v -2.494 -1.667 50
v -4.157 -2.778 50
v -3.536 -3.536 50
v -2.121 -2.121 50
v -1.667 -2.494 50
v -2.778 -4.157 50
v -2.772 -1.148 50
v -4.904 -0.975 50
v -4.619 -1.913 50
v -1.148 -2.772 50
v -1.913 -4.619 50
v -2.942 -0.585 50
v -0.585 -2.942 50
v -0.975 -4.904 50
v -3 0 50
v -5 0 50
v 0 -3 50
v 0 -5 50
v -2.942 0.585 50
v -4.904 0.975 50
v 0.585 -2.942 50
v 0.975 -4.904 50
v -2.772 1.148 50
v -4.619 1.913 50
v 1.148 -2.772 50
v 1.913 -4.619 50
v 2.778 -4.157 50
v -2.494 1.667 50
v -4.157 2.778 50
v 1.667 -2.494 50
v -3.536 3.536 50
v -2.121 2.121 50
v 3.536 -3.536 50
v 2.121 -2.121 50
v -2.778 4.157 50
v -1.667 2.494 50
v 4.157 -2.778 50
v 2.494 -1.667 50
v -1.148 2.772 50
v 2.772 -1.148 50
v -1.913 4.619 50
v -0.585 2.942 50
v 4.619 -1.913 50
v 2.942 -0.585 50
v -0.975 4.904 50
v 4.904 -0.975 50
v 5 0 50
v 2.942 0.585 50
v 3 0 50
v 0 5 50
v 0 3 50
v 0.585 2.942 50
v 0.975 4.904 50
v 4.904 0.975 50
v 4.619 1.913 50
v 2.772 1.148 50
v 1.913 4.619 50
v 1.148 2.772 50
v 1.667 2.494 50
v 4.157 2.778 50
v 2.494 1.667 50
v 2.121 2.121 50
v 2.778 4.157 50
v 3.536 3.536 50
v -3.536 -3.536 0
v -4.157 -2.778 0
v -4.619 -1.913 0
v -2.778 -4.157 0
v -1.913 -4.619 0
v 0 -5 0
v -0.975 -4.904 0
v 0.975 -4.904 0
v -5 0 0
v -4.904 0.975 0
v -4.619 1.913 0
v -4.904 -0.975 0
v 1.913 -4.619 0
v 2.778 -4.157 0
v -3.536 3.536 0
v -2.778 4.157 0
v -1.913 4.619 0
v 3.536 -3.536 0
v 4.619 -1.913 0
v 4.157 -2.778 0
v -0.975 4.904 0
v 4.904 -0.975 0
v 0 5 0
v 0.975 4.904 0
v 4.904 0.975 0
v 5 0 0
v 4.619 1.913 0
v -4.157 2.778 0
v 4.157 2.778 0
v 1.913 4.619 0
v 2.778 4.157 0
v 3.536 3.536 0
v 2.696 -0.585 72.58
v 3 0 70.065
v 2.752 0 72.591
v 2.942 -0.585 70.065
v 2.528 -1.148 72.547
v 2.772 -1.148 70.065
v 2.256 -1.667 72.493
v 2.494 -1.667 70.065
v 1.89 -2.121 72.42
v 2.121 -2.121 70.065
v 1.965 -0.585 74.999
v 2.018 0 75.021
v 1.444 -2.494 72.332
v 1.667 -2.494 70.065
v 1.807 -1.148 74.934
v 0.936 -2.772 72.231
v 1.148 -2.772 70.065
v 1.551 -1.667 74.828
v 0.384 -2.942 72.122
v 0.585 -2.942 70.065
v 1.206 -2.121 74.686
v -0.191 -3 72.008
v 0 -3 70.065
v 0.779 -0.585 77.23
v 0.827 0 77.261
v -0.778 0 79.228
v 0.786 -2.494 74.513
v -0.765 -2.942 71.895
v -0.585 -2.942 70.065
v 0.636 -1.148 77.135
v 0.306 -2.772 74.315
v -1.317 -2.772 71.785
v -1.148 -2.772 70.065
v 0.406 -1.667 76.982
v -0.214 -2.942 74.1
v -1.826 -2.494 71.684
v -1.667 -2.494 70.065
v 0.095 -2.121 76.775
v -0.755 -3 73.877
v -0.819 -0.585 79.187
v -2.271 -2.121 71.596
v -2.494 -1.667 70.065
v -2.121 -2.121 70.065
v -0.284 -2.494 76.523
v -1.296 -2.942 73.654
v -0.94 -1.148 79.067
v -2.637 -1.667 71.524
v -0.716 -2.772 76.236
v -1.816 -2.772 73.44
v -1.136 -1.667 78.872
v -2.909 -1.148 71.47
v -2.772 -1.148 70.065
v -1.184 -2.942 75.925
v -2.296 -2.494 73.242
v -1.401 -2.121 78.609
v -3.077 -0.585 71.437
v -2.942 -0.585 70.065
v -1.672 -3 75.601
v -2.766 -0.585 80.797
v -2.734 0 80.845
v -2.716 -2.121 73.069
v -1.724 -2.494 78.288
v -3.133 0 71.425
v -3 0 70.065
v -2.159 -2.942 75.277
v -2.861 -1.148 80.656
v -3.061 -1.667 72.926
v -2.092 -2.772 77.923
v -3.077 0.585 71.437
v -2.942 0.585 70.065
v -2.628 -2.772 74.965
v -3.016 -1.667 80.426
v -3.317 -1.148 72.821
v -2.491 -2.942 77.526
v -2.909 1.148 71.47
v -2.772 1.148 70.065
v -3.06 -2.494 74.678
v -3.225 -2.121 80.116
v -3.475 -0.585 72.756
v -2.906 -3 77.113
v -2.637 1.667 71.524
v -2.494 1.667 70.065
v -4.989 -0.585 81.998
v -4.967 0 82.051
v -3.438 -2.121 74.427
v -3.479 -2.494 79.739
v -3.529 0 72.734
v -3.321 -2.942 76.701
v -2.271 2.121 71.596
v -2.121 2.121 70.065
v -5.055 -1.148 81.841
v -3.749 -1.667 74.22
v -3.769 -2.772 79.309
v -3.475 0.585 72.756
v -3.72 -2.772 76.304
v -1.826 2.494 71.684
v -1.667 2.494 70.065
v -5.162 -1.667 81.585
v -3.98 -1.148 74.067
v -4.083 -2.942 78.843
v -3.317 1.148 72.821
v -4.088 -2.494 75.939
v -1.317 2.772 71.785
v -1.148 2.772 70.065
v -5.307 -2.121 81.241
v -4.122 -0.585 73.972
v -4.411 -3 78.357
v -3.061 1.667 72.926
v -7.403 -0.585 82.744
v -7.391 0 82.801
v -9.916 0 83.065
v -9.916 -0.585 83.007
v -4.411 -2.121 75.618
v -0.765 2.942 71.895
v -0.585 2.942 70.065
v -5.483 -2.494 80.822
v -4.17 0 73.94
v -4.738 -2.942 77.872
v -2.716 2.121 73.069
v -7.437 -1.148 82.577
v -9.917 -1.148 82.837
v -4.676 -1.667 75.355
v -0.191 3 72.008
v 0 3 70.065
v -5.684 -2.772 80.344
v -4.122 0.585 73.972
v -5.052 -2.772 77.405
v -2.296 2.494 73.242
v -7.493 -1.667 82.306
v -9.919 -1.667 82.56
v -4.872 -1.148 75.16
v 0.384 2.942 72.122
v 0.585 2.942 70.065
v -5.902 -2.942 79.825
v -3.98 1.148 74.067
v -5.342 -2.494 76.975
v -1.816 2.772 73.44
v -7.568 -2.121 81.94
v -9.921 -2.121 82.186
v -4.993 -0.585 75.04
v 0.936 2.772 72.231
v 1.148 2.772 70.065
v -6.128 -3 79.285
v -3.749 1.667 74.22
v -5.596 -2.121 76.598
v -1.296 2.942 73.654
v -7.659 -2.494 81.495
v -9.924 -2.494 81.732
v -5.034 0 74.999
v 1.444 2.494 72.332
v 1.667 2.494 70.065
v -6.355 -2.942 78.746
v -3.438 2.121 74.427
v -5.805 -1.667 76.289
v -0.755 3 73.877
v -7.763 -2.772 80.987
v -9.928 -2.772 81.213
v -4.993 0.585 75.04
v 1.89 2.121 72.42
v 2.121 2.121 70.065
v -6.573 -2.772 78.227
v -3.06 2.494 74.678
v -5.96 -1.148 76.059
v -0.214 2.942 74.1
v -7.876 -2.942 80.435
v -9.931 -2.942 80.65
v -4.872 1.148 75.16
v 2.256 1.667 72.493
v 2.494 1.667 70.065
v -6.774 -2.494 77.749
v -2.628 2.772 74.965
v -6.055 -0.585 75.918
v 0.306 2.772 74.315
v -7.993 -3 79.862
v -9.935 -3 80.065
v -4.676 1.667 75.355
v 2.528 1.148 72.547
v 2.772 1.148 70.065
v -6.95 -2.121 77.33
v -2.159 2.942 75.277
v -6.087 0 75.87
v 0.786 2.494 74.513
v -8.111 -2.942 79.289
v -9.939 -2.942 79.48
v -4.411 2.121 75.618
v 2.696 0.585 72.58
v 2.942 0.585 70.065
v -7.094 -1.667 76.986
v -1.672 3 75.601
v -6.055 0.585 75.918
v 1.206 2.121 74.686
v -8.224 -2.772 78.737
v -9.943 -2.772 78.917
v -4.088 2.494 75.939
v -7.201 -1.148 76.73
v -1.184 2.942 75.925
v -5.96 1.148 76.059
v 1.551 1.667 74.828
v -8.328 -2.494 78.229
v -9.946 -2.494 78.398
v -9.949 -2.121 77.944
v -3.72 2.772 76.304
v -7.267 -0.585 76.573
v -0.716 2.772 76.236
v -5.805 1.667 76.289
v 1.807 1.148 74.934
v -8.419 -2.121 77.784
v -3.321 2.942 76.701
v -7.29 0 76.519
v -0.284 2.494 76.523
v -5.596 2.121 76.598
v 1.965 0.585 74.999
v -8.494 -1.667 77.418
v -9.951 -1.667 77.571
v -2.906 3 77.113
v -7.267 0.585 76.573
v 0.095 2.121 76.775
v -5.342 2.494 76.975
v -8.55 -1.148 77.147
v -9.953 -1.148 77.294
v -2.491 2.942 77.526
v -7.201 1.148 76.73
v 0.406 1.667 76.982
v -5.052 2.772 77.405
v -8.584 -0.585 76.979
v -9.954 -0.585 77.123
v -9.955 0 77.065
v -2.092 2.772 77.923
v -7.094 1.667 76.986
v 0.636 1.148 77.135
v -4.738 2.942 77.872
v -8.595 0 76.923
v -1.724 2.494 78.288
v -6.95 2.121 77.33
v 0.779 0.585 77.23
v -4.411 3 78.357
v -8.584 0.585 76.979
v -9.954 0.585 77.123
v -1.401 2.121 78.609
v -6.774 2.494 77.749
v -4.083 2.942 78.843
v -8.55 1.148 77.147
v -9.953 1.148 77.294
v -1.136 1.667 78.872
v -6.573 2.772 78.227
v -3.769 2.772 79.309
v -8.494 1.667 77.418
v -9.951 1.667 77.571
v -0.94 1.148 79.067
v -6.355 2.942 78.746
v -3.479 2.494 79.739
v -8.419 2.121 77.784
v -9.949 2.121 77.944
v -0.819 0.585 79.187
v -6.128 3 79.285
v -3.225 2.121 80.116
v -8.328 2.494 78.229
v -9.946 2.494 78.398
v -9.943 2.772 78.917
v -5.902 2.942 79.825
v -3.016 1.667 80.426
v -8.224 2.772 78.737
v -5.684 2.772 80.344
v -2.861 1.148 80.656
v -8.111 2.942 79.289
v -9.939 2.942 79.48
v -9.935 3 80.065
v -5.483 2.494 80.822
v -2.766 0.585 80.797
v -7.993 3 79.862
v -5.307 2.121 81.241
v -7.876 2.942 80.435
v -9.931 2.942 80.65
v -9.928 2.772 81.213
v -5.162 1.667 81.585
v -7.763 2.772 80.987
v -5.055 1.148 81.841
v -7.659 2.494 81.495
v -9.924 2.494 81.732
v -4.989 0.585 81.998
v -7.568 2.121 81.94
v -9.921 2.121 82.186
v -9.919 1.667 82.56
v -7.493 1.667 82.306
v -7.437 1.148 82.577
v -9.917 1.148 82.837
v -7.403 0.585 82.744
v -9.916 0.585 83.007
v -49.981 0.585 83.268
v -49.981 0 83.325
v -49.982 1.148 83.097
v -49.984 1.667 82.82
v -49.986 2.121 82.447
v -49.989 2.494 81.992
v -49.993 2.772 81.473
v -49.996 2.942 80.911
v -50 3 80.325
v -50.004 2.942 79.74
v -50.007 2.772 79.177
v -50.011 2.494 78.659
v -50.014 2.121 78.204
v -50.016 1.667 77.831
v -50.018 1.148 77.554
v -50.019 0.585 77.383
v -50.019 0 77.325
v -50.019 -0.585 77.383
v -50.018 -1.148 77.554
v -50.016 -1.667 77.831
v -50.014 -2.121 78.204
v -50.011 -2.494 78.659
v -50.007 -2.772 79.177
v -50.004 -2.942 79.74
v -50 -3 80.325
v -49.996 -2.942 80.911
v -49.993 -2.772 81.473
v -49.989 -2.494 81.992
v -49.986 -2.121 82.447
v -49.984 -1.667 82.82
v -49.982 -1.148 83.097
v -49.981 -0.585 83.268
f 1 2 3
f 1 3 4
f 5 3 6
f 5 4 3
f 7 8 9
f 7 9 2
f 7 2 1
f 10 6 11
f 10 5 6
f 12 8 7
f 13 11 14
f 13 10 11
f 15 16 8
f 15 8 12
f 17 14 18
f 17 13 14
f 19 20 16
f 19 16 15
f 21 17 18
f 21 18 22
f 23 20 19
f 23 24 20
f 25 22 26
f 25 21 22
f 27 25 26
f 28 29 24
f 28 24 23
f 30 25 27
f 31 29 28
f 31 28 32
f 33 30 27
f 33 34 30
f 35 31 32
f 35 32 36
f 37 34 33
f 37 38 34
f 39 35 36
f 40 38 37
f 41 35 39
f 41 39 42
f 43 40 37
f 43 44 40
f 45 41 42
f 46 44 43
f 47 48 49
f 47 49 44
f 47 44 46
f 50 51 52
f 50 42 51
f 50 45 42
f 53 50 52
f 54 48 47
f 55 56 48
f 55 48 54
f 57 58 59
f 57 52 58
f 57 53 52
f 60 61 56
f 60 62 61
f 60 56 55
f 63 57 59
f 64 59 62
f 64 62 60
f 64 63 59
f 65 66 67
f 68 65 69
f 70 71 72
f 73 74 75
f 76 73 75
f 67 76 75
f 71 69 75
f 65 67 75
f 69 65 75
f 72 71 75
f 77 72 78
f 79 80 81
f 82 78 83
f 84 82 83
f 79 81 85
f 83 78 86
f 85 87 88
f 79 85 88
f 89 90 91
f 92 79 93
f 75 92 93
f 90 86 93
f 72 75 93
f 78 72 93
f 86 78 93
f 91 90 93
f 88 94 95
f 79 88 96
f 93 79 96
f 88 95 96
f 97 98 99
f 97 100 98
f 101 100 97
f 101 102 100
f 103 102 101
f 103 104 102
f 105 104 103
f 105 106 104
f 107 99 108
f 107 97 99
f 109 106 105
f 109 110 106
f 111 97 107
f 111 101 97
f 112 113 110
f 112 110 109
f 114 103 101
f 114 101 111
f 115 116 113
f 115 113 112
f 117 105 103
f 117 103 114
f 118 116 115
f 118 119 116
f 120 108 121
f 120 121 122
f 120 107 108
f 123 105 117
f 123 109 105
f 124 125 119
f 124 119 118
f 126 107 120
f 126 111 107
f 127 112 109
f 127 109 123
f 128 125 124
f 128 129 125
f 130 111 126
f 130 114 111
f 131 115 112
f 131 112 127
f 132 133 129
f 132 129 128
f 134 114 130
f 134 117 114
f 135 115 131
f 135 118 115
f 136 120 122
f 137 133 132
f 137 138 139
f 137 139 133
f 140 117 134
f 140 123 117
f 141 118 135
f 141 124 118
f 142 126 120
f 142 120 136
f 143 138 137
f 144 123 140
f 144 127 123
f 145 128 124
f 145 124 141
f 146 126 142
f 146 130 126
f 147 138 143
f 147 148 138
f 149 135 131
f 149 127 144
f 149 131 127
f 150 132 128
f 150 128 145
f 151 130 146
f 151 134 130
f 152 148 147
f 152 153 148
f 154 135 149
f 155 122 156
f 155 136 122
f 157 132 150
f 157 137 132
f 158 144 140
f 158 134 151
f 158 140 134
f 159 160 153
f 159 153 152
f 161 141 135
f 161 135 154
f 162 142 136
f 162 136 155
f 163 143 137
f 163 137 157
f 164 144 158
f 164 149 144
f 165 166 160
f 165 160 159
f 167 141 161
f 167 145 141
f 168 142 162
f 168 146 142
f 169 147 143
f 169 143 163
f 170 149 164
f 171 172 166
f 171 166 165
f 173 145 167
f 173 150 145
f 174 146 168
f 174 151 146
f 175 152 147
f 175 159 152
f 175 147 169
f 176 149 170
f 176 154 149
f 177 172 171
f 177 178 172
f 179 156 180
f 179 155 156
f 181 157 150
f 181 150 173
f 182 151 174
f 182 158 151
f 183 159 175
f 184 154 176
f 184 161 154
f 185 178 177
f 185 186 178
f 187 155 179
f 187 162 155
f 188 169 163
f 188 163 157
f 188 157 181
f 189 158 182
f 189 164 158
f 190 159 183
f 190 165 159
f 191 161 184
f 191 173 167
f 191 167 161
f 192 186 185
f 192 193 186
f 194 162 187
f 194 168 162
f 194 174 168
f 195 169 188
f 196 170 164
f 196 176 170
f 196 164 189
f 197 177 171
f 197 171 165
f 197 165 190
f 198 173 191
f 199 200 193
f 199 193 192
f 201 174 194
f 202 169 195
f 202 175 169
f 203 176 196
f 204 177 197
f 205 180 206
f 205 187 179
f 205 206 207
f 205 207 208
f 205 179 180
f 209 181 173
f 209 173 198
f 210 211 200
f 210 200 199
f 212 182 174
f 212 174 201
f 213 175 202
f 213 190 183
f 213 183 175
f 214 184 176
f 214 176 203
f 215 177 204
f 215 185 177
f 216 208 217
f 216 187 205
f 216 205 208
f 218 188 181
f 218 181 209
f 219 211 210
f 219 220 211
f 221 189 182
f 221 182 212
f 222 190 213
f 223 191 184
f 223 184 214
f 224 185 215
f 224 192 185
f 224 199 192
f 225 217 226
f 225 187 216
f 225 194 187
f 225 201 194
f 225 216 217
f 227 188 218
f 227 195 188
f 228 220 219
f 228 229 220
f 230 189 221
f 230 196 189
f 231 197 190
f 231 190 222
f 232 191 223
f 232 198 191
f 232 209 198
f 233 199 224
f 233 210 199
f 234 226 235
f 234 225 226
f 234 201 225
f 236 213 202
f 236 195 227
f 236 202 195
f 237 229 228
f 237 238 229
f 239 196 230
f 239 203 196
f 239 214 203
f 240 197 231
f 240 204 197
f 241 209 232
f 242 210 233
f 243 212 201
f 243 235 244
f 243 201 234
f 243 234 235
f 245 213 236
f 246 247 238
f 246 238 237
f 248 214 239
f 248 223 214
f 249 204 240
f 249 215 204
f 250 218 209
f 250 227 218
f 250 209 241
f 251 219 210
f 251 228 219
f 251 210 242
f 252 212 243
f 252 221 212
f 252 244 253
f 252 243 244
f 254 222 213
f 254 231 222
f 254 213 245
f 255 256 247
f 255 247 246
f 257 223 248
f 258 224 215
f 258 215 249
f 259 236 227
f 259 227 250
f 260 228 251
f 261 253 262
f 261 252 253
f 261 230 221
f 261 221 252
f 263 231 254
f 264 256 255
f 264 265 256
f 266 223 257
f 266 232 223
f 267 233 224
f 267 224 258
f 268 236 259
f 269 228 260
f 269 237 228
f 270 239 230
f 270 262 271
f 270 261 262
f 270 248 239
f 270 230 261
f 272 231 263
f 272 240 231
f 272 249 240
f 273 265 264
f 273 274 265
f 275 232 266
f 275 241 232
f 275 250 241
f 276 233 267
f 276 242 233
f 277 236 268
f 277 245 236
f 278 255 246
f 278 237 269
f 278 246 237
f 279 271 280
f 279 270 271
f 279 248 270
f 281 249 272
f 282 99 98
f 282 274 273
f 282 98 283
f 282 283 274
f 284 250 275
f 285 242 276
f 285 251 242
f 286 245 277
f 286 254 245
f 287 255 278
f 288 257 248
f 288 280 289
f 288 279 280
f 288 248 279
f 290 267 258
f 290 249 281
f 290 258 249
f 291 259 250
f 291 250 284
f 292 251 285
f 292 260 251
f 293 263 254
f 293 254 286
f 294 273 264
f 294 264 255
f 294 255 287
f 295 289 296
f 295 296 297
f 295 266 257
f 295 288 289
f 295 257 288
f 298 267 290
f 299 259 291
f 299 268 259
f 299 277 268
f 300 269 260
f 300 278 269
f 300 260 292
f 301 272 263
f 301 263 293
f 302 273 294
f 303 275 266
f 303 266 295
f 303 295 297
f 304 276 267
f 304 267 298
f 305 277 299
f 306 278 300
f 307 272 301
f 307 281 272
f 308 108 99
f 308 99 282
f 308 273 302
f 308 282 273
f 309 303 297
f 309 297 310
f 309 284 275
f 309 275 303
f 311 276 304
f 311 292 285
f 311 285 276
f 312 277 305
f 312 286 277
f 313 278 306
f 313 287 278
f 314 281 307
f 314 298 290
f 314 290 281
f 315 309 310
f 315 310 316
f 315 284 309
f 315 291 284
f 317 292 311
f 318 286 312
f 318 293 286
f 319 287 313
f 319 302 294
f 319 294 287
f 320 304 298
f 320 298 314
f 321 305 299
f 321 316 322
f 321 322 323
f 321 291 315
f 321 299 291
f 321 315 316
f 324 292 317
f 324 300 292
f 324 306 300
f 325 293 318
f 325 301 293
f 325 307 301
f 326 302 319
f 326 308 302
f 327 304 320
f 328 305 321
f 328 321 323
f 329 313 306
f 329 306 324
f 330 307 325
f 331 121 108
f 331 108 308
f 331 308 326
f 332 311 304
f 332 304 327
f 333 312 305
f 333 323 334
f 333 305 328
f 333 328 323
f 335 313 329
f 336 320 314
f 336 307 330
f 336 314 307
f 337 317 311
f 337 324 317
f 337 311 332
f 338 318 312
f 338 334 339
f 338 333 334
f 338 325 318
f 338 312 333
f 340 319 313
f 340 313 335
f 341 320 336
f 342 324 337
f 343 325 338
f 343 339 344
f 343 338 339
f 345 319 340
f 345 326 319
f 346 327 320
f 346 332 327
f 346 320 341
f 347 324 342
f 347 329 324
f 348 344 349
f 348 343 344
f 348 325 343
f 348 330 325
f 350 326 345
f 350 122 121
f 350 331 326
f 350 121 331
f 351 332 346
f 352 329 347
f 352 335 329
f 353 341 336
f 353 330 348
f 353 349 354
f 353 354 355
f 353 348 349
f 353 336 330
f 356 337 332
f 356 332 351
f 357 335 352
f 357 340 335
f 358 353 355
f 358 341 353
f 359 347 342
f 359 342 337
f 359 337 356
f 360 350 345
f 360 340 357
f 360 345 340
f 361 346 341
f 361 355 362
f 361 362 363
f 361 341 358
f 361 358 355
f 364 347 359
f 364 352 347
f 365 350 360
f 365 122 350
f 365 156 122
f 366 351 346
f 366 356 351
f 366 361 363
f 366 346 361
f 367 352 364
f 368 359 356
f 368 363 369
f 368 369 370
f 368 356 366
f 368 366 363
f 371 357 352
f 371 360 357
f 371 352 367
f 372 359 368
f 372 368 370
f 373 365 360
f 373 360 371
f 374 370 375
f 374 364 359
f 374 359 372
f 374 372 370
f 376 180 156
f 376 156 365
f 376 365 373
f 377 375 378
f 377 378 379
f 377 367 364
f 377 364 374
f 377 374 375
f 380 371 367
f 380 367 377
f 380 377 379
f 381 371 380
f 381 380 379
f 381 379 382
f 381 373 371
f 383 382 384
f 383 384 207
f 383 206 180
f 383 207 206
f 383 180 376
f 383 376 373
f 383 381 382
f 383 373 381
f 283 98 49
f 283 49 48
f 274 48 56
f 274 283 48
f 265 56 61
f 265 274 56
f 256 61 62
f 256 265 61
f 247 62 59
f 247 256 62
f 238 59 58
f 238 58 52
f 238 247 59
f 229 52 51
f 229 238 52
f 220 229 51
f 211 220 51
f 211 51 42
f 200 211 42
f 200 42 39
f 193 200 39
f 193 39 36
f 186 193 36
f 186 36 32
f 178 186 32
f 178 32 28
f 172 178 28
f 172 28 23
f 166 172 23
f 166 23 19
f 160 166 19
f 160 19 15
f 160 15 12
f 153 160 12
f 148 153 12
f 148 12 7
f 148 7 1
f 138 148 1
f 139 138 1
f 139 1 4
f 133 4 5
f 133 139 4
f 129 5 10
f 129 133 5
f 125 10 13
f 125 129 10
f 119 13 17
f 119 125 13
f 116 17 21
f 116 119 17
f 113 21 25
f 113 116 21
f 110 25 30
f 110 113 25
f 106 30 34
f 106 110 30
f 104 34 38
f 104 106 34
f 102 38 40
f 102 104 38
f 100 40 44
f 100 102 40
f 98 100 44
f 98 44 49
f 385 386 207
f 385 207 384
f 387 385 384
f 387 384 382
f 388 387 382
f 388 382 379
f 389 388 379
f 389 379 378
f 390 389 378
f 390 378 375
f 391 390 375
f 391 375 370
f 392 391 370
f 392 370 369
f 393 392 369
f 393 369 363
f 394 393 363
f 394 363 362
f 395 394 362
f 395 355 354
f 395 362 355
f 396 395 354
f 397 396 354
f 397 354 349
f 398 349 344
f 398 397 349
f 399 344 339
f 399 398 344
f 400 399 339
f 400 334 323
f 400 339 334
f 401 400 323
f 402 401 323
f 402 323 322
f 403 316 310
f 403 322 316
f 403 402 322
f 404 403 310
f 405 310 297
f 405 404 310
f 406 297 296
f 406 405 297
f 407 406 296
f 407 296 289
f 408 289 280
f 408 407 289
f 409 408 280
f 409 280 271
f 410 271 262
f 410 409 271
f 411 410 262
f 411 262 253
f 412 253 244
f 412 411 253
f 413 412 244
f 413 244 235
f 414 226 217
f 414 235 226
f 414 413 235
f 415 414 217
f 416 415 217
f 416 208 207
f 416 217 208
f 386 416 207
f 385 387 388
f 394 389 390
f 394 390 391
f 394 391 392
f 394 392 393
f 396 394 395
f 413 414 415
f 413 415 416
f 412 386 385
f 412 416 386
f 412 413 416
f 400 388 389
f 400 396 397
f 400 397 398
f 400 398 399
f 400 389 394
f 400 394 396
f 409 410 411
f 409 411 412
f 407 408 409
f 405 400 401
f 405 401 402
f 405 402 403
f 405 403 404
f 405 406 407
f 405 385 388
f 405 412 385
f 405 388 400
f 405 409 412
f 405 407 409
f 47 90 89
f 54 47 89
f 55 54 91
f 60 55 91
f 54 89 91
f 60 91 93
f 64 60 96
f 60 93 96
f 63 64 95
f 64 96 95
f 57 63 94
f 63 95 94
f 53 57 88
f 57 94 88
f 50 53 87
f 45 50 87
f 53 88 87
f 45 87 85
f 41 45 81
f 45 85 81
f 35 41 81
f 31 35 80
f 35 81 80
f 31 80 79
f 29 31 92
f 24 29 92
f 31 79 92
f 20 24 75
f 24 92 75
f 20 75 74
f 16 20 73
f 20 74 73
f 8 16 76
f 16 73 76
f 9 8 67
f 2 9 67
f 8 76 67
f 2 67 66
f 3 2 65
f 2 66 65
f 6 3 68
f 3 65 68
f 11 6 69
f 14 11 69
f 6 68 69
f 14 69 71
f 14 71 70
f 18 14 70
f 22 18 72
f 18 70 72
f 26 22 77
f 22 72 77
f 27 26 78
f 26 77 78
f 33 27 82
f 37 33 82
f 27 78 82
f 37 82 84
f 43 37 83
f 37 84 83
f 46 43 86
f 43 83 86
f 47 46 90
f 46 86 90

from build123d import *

# Parameters (mm, degrees)
F0_R     = 5
F1_DEPTH = 50
F2_R     = 3


with BuildPart() as f1:
    # F0 (on Top) → F1 (new body)
    with BuildSketch(Plane.XY):
        Circle(F0_R)
    extrude(amount=F1_DEPTH)

    # F4: sweep along a path in F3
    with BuildLine(Plane.XZ) as f4_path:
        Line((0, 50), (0, 70.065357))
        ThreePointArc((0, 70.065357), (-2.906012, 77.11343), (-9.935066, 80.065146))
        Line((-9.935066, 80.065146), (-50, 80.325309))
    # F2 (on face) → F4 (sweep)
    with BuildSketch(Plane.XY.offset(50)):
        Circle(F2_R)
    sweep(path=f4_path.line)


solid = f1.part
